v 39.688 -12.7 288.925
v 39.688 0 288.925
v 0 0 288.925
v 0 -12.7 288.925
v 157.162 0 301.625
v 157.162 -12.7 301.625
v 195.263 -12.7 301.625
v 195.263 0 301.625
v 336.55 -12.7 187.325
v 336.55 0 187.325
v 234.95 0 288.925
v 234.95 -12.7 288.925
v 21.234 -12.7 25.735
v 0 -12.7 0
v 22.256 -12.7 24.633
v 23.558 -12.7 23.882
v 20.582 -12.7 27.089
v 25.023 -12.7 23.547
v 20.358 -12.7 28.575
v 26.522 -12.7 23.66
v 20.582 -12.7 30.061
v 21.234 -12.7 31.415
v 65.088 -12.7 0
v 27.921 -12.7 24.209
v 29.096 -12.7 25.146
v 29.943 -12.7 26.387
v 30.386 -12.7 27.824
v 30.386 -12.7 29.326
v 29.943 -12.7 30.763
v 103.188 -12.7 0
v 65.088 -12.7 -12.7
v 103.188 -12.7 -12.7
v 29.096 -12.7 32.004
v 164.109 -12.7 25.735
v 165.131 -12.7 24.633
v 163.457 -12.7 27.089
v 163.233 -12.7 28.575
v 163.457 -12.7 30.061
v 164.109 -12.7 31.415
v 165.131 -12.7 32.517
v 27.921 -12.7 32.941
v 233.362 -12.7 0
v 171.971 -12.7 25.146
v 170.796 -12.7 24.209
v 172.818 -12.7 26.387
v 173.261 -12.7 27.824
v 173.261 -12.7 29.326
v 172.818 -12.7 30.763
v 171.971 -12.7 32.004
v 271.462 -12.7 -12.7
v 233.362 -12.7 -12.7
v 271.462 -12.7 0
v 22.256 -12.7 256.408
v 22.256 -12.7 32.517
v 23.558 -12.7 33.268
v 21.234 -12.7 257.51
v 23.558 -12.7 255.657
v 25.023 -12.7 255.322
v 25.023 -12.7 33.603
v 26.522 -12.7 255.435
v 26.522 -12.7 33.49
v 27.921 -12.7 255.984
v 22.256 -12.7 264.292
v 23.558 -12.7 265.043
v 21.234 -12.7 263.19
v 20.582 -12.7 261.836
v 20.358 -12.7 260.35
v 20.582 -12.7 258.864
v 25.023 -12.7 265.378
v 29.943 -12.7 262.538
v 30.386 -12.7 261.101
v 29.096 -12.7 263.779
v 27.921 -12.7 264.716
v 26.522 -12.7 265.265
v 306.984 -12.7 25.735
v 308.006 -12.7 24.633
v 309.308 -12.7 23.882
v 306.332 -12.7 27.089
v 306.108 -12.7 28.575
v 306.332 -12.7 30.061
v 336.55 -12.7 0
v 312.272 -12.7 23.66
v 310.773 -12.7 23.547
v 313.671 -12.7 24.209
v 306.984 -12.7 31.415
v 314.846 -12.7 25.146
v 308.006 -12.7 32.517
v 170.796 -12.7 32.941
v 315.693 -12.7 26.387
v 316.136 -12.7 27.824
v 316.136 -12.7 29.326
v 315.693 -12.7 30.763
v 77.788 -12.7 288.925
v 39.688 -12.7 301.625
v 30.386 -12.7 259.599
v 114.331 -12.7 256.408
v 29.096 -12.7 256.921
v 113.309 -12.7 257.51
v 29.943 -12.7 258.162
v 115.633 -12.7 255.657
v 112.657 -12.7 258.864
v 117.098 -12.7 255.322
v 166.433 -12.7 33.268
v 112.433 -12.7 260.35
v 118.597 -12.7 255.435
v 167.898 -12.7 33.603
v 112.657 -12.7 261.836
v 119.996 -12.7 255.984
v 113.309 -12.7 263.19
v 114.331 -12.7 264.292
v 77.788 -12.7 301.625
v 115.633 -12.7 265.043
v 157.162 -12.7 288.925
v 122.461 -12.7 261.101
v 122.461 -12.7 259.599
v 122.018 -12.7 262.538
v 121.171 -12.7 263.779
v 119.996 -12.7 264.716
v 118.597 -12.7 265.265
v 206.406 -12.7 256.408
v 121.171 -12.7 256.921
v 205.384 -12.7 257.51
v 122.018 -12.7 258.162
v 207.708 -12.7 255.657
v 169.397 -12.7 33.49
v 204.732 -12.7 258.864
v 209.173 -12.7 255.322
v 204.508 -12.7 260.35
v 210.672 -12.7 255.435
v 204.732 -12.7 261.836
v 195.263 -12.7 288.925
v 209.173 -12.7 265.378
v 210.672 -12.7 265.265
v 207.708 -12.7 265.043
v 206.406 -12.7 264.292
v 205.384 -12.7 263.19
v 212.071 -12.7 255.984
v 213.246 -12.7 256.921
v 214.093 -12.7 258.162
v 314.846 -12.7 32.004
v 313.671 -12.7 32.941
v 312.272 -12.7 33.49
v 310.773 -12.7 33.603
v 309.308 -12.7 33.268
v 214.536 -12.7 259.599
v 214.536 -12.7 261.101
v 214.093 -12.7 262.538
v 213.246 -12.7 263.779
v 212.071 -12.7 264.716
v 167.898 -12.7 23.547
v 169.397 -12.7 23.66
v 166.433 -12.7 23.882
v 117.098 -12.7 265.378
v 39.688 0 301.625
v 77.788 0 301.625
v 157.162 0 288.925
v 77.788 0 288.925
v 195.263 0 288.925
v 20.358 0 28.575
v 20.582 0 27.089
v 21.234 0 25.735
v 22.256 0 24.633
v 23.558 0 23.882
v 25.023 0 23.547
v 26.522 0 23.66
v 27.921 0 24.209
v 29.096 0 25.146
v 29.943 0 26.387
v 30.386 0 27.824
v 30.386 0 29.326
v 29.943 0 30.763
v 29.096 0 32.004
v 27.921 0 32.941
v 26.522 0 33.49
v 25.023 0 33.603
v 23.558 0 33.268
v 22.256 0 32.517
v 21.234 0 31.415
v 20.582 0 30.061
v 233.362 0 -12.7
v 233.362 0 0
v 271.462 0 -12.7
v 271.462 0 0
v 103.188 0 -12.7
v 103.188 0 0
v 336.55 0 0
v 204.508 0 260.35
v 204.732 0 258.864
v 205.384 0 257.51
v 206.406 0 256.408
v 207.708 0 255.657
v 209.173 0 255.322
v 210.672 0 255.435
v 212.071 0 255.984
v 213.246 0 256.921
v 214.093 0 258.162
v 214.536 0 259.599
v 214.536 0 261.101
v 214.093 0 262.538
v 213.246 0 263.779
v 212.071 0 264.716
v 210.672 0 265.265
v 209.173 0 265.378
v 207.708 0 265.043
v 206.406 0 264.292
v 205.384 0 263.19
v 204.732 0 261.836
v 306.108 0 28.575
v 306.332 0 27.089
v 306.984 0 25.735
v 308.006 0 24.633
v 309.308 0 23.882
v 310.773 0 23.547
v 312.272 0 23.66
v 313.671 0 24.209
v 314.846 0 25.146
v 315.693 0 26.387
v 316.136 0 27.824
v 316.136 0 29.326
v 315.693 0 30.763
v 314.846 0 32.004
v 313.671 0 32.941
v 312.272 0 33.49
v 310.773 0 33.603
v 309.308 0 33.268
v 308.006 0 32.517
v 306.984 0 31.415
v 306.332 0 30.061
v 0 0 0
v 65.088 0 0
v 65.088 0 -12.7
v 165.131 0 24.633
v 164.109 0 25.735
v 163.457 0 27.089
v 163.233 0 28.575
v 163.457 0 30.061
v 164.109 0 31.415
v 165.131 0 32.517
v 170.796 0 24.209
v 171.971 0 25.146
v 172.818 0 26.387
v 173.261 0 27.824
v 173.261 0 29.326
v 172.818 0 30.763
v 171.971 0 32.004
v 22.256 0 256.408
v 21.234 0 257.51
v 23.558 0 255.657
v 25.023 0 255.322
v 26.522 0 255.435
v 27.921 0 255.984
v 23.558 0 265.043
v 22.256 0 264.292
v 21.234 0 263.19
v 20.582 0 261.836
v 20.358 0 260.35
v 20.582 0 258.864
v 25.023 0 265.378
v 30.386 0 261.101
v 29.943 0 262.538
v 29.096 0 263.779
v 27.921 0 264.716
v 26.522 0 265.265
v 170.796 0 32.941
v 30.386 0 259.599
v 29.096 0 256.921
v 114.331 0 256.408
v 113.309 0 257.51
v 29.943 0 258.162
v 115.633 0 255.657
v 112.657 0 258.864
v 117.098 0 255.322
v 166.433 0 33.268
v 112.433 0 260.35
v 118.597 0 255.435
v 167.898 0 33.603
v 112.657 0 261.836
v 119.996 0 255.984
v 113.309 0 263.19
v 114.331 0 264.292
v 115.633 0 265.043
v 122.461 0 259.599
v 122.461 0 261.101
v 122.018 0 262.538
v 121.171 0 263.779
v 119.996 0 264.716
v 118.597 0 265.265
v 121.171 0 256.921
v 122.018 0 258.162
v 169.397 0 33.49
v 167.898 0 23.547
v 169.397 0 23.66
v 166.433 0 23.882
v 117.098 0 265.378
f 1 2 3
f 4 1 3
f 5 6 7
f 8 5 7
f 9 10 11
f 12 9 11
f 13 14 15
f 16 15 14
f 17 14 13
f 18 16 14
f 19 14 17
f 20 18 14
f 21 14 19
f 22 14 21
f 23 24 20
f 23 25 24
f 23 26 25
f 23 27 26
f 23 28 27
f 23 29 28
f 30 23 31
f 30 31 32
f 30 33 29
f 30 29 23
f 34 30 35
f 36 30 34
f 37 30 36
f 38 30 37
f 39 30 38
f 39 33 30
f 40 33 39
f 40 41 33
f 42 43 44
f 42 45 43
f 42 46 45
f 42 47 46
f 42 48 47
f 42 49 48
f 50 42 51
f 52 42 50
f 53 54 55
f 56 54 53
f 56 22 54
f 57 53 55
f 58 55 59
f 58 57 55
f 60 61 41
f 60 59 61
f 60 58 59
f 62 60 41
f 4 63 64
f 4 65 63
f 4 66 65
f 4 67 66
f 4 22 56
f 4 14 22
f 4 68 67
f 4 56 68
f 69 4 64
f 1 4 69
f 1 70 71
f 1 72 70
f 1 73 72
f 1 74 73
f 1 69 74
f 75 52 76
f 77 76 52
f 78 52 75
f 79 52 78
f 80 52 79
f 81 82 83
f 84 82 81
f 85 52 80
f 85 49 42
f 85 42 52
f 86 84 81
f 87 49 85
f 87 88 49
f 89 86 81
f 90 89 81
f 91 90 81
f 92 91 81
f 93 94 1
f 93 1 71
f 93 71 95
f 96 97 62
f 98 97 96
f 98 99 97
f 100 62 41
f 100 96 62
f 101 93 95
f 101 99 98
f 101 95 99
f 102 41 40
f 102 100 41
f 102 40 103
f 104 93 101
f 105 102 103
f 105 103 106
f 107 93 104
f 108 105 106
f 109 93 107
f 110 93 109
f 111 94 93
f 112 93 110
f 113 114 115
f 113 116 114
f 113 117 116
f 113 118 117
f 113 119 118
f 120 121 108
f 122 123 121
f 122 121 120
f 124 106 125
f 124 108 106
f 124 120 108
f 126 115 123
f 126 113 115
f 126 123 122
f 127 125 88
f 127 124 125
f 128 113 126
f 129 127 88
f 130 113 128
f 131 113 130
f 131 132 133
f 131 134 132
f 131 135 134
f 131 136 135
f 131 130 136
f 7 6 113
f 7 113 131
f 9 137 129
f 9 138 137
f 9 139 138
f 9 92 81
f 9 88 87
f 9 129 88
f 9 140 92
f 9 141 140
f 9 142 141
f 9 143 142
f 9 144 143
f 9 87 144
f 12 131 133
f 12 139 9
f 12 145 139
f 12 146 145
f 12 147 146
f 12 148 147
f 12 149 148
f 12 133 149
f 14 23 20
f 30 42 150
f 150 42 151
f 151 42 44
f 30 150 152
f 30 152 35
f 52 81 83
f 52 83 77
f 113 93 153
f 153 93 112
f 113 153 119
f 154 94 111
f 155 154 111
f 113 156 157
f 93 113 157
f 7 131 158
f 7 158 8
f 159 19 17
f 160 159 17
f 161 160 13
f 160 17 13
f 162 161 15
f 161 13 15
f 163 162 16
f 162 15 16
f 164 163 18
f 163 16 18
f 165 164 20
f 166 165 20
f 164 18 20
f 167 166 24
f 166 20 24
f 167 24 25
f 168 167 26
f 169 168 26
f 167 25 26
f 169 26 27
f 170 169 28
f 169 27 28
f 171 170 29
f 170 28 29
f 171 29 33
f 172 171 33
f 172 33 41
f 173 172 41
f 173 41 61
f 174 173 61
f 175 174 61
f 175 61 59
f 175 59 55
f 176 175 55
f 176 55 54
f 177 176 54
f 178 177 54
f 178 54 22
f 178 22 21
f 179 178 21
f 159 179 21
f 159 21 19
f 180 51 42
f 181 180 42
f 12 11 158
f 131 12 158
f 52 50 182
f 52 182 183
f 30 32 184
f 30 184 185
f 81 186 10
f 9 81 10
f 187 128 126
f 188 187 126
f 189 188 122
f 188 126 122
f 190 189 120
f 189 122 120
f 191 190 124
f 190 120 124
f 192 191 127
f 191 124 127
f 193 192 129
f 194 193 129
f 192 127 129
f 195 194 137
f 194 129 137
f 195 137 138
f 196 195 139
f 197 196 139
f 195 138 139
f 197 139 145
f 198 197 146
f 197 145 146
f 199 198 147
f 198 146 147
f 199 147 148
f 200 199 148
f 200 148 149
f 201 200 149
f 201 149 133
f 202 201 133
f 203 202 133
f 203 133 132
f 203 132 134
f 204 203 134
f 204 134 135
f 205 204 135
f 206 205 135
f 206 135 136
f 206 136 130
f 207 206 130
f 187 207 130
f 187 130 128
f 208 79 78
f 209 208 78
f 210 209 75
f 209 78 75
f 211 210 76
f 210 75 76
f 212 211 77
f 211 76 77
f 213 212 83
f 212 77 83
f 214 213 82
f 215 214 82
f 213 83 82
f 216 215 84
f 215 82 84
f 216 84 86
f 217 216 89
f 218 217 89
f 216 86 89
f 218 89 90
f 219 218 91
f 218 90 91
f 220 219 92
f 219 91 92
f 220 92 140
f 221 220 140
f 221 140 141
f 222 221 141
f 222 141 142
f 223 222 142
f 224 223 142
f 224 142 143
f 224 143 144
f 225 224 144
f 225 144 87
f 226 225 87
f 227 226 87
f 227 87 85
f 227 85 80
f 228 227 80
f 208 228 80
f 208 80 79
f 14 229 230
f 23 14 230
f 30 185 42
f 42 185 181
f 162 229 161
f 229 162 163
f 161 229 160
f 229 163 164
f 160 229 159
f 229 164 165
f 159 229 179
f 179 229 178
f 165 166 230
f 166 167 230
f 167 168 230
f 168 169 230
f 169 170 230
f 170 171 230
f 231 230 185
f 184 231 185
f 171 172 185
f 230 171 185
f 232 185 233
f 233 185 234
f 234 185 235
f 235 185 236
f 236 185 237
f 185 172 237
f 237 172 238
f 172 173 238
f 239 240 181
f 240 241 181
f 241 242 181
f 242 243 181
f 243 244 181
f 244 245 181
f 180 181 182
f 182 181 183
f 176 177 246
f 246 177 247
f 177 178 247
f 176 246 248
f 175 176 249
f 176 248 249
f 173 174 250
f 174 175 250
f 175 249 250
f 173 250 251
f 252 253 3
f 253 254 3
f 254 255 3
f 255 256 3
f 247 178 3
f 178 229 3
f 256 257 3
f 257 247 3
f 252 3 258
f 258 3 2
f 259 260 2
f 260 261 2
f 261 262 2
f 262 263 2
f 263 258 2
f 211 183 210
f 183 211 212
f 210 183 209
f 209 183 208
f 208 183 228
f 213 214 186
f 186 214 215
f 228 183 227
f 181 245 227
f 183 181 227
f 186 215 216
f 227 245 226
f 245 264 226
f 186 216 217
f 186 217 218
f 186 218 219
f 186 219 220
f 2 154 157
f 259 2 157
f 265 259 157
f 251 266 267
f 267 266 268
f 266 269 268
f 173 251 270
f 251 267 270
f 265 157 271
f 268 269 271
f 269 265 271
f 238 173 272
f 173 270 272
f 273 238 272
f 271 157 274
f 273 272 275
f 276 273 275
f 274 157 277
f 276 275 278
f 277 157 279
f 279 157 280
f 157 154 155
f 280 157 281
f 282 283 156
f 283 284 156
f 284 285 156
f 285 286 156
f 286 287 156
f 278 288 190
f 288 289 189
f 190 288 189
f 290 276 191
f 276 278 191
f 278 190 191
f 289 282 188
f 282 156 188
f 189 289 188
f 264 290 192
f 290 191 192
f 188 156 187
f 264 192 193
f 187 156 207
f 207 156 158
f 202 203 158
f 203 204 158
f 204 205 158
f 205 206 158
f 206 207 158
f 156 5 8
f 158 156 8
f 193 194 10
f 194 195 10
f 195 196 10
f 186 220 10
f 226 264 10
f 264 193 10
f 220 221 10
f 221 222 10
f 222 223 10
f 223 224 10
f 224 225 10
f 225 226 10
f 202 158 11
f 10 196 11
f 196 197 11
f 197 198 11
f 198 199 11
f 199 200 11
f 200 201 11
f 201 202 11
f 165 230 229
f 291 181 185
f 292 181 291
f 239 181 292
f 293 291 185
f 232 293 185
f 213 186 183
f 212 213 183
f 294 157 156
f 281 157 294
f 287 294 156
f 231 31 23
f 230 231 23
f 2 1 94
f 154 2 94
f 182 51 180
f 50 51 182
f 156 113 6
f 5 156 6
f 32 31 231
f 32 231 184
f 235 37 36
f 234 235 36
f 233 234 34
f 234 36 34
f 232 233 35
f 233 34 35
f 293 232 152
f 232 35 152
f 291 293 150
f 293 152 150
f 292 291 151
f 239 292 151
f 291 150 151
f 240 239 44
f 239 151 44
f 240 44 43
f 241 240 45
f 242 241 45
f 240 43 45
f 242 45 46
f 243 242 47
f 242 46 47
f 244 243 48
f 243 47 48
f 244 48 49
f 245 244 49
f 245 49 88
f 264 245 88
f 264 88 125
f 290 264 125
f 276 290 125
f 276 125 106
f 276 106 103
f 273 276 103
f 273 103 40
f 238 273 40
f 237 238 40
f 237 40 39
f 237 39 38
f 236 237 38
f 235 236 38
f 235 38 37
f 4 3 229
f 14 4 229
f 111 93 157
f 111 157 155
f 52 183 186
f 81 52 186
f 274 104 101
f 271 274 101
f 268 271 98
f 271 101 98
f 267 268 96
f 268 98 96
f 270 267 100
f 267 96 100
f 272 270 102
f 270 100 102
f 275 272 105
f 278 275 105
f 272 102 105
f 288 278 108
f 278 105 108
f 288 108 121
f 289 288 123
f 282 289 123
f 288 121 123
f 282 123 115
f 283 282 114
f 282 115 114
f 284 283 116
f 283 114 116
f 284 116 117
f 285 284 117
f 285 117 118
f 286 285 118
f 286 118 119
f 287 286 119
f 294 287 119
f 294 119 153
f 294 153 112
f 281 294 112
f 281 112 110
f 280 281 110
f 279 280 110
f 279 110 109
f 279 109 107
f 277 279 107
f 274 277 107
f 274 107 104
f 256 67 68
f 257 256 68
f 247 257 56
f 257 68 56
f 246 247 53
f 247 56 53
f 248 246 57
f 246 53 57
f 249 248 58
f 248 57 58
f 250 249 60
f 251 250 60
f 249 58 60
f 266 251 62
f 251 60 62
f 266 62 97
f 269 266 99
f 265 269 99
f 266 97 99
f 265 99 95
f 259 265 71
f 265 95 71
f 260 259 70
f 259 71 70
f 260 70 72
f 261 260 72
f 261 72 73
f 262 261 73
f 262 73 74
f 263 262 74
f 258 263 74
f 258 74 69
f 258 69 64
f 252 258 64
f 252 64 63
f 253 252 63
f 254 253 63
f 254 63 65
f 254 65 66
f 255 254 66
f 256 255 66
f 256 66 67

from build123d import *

# Parameters (mm, degrees)
F1_DEPTH = 12.7
F2_D     = 10.0838
F3_W     = 38.1
F3_H     = 12.7
F4_DEPTH = 12.7


with BuildPart() as f1:
    # F0 (on Front) → F1 (new body)
    with BuildSketch(Plane.XZ):
        Polygon((0, 288.925), (0, 0), (336.55, 0), (336.55, 187.325), (234.95, 288.925), align=None)
    extrude(amount=F1_DEPTH)

    # F2 (through all)
    with Locations(Plane(origin=(0, 0, 0), x_dir=(1, 0, 0), z_dir=(0, 1, 0))):
        with Locations((311.15, -28.575), (168.275, -28.575), (25.4, -28.575), (25.4, -260.35), (209.55, -260.35), (117.475, -260.35)):
            Hole(F2_D / 2)

    # F3 (on face) → F4 (join)
    with BuildSketch(Plane.XZ.offset(12.7)):
        with Locations((58.7375, 295.275)):
            Rectangle(F3_W, F3_H)
        with Locations((176.2125, 295.275)):
            Rectangle(F3_W, F3_H)
        with Locations((84.1375, -6.35)):
            Rectangle(F3_W, F3_H)
        with Locations((252.4125, -6.35)):
            Rectangle(F3_W, F3_H)
    extrude(amount=-F4_DEPTH)


solid = f1.part
